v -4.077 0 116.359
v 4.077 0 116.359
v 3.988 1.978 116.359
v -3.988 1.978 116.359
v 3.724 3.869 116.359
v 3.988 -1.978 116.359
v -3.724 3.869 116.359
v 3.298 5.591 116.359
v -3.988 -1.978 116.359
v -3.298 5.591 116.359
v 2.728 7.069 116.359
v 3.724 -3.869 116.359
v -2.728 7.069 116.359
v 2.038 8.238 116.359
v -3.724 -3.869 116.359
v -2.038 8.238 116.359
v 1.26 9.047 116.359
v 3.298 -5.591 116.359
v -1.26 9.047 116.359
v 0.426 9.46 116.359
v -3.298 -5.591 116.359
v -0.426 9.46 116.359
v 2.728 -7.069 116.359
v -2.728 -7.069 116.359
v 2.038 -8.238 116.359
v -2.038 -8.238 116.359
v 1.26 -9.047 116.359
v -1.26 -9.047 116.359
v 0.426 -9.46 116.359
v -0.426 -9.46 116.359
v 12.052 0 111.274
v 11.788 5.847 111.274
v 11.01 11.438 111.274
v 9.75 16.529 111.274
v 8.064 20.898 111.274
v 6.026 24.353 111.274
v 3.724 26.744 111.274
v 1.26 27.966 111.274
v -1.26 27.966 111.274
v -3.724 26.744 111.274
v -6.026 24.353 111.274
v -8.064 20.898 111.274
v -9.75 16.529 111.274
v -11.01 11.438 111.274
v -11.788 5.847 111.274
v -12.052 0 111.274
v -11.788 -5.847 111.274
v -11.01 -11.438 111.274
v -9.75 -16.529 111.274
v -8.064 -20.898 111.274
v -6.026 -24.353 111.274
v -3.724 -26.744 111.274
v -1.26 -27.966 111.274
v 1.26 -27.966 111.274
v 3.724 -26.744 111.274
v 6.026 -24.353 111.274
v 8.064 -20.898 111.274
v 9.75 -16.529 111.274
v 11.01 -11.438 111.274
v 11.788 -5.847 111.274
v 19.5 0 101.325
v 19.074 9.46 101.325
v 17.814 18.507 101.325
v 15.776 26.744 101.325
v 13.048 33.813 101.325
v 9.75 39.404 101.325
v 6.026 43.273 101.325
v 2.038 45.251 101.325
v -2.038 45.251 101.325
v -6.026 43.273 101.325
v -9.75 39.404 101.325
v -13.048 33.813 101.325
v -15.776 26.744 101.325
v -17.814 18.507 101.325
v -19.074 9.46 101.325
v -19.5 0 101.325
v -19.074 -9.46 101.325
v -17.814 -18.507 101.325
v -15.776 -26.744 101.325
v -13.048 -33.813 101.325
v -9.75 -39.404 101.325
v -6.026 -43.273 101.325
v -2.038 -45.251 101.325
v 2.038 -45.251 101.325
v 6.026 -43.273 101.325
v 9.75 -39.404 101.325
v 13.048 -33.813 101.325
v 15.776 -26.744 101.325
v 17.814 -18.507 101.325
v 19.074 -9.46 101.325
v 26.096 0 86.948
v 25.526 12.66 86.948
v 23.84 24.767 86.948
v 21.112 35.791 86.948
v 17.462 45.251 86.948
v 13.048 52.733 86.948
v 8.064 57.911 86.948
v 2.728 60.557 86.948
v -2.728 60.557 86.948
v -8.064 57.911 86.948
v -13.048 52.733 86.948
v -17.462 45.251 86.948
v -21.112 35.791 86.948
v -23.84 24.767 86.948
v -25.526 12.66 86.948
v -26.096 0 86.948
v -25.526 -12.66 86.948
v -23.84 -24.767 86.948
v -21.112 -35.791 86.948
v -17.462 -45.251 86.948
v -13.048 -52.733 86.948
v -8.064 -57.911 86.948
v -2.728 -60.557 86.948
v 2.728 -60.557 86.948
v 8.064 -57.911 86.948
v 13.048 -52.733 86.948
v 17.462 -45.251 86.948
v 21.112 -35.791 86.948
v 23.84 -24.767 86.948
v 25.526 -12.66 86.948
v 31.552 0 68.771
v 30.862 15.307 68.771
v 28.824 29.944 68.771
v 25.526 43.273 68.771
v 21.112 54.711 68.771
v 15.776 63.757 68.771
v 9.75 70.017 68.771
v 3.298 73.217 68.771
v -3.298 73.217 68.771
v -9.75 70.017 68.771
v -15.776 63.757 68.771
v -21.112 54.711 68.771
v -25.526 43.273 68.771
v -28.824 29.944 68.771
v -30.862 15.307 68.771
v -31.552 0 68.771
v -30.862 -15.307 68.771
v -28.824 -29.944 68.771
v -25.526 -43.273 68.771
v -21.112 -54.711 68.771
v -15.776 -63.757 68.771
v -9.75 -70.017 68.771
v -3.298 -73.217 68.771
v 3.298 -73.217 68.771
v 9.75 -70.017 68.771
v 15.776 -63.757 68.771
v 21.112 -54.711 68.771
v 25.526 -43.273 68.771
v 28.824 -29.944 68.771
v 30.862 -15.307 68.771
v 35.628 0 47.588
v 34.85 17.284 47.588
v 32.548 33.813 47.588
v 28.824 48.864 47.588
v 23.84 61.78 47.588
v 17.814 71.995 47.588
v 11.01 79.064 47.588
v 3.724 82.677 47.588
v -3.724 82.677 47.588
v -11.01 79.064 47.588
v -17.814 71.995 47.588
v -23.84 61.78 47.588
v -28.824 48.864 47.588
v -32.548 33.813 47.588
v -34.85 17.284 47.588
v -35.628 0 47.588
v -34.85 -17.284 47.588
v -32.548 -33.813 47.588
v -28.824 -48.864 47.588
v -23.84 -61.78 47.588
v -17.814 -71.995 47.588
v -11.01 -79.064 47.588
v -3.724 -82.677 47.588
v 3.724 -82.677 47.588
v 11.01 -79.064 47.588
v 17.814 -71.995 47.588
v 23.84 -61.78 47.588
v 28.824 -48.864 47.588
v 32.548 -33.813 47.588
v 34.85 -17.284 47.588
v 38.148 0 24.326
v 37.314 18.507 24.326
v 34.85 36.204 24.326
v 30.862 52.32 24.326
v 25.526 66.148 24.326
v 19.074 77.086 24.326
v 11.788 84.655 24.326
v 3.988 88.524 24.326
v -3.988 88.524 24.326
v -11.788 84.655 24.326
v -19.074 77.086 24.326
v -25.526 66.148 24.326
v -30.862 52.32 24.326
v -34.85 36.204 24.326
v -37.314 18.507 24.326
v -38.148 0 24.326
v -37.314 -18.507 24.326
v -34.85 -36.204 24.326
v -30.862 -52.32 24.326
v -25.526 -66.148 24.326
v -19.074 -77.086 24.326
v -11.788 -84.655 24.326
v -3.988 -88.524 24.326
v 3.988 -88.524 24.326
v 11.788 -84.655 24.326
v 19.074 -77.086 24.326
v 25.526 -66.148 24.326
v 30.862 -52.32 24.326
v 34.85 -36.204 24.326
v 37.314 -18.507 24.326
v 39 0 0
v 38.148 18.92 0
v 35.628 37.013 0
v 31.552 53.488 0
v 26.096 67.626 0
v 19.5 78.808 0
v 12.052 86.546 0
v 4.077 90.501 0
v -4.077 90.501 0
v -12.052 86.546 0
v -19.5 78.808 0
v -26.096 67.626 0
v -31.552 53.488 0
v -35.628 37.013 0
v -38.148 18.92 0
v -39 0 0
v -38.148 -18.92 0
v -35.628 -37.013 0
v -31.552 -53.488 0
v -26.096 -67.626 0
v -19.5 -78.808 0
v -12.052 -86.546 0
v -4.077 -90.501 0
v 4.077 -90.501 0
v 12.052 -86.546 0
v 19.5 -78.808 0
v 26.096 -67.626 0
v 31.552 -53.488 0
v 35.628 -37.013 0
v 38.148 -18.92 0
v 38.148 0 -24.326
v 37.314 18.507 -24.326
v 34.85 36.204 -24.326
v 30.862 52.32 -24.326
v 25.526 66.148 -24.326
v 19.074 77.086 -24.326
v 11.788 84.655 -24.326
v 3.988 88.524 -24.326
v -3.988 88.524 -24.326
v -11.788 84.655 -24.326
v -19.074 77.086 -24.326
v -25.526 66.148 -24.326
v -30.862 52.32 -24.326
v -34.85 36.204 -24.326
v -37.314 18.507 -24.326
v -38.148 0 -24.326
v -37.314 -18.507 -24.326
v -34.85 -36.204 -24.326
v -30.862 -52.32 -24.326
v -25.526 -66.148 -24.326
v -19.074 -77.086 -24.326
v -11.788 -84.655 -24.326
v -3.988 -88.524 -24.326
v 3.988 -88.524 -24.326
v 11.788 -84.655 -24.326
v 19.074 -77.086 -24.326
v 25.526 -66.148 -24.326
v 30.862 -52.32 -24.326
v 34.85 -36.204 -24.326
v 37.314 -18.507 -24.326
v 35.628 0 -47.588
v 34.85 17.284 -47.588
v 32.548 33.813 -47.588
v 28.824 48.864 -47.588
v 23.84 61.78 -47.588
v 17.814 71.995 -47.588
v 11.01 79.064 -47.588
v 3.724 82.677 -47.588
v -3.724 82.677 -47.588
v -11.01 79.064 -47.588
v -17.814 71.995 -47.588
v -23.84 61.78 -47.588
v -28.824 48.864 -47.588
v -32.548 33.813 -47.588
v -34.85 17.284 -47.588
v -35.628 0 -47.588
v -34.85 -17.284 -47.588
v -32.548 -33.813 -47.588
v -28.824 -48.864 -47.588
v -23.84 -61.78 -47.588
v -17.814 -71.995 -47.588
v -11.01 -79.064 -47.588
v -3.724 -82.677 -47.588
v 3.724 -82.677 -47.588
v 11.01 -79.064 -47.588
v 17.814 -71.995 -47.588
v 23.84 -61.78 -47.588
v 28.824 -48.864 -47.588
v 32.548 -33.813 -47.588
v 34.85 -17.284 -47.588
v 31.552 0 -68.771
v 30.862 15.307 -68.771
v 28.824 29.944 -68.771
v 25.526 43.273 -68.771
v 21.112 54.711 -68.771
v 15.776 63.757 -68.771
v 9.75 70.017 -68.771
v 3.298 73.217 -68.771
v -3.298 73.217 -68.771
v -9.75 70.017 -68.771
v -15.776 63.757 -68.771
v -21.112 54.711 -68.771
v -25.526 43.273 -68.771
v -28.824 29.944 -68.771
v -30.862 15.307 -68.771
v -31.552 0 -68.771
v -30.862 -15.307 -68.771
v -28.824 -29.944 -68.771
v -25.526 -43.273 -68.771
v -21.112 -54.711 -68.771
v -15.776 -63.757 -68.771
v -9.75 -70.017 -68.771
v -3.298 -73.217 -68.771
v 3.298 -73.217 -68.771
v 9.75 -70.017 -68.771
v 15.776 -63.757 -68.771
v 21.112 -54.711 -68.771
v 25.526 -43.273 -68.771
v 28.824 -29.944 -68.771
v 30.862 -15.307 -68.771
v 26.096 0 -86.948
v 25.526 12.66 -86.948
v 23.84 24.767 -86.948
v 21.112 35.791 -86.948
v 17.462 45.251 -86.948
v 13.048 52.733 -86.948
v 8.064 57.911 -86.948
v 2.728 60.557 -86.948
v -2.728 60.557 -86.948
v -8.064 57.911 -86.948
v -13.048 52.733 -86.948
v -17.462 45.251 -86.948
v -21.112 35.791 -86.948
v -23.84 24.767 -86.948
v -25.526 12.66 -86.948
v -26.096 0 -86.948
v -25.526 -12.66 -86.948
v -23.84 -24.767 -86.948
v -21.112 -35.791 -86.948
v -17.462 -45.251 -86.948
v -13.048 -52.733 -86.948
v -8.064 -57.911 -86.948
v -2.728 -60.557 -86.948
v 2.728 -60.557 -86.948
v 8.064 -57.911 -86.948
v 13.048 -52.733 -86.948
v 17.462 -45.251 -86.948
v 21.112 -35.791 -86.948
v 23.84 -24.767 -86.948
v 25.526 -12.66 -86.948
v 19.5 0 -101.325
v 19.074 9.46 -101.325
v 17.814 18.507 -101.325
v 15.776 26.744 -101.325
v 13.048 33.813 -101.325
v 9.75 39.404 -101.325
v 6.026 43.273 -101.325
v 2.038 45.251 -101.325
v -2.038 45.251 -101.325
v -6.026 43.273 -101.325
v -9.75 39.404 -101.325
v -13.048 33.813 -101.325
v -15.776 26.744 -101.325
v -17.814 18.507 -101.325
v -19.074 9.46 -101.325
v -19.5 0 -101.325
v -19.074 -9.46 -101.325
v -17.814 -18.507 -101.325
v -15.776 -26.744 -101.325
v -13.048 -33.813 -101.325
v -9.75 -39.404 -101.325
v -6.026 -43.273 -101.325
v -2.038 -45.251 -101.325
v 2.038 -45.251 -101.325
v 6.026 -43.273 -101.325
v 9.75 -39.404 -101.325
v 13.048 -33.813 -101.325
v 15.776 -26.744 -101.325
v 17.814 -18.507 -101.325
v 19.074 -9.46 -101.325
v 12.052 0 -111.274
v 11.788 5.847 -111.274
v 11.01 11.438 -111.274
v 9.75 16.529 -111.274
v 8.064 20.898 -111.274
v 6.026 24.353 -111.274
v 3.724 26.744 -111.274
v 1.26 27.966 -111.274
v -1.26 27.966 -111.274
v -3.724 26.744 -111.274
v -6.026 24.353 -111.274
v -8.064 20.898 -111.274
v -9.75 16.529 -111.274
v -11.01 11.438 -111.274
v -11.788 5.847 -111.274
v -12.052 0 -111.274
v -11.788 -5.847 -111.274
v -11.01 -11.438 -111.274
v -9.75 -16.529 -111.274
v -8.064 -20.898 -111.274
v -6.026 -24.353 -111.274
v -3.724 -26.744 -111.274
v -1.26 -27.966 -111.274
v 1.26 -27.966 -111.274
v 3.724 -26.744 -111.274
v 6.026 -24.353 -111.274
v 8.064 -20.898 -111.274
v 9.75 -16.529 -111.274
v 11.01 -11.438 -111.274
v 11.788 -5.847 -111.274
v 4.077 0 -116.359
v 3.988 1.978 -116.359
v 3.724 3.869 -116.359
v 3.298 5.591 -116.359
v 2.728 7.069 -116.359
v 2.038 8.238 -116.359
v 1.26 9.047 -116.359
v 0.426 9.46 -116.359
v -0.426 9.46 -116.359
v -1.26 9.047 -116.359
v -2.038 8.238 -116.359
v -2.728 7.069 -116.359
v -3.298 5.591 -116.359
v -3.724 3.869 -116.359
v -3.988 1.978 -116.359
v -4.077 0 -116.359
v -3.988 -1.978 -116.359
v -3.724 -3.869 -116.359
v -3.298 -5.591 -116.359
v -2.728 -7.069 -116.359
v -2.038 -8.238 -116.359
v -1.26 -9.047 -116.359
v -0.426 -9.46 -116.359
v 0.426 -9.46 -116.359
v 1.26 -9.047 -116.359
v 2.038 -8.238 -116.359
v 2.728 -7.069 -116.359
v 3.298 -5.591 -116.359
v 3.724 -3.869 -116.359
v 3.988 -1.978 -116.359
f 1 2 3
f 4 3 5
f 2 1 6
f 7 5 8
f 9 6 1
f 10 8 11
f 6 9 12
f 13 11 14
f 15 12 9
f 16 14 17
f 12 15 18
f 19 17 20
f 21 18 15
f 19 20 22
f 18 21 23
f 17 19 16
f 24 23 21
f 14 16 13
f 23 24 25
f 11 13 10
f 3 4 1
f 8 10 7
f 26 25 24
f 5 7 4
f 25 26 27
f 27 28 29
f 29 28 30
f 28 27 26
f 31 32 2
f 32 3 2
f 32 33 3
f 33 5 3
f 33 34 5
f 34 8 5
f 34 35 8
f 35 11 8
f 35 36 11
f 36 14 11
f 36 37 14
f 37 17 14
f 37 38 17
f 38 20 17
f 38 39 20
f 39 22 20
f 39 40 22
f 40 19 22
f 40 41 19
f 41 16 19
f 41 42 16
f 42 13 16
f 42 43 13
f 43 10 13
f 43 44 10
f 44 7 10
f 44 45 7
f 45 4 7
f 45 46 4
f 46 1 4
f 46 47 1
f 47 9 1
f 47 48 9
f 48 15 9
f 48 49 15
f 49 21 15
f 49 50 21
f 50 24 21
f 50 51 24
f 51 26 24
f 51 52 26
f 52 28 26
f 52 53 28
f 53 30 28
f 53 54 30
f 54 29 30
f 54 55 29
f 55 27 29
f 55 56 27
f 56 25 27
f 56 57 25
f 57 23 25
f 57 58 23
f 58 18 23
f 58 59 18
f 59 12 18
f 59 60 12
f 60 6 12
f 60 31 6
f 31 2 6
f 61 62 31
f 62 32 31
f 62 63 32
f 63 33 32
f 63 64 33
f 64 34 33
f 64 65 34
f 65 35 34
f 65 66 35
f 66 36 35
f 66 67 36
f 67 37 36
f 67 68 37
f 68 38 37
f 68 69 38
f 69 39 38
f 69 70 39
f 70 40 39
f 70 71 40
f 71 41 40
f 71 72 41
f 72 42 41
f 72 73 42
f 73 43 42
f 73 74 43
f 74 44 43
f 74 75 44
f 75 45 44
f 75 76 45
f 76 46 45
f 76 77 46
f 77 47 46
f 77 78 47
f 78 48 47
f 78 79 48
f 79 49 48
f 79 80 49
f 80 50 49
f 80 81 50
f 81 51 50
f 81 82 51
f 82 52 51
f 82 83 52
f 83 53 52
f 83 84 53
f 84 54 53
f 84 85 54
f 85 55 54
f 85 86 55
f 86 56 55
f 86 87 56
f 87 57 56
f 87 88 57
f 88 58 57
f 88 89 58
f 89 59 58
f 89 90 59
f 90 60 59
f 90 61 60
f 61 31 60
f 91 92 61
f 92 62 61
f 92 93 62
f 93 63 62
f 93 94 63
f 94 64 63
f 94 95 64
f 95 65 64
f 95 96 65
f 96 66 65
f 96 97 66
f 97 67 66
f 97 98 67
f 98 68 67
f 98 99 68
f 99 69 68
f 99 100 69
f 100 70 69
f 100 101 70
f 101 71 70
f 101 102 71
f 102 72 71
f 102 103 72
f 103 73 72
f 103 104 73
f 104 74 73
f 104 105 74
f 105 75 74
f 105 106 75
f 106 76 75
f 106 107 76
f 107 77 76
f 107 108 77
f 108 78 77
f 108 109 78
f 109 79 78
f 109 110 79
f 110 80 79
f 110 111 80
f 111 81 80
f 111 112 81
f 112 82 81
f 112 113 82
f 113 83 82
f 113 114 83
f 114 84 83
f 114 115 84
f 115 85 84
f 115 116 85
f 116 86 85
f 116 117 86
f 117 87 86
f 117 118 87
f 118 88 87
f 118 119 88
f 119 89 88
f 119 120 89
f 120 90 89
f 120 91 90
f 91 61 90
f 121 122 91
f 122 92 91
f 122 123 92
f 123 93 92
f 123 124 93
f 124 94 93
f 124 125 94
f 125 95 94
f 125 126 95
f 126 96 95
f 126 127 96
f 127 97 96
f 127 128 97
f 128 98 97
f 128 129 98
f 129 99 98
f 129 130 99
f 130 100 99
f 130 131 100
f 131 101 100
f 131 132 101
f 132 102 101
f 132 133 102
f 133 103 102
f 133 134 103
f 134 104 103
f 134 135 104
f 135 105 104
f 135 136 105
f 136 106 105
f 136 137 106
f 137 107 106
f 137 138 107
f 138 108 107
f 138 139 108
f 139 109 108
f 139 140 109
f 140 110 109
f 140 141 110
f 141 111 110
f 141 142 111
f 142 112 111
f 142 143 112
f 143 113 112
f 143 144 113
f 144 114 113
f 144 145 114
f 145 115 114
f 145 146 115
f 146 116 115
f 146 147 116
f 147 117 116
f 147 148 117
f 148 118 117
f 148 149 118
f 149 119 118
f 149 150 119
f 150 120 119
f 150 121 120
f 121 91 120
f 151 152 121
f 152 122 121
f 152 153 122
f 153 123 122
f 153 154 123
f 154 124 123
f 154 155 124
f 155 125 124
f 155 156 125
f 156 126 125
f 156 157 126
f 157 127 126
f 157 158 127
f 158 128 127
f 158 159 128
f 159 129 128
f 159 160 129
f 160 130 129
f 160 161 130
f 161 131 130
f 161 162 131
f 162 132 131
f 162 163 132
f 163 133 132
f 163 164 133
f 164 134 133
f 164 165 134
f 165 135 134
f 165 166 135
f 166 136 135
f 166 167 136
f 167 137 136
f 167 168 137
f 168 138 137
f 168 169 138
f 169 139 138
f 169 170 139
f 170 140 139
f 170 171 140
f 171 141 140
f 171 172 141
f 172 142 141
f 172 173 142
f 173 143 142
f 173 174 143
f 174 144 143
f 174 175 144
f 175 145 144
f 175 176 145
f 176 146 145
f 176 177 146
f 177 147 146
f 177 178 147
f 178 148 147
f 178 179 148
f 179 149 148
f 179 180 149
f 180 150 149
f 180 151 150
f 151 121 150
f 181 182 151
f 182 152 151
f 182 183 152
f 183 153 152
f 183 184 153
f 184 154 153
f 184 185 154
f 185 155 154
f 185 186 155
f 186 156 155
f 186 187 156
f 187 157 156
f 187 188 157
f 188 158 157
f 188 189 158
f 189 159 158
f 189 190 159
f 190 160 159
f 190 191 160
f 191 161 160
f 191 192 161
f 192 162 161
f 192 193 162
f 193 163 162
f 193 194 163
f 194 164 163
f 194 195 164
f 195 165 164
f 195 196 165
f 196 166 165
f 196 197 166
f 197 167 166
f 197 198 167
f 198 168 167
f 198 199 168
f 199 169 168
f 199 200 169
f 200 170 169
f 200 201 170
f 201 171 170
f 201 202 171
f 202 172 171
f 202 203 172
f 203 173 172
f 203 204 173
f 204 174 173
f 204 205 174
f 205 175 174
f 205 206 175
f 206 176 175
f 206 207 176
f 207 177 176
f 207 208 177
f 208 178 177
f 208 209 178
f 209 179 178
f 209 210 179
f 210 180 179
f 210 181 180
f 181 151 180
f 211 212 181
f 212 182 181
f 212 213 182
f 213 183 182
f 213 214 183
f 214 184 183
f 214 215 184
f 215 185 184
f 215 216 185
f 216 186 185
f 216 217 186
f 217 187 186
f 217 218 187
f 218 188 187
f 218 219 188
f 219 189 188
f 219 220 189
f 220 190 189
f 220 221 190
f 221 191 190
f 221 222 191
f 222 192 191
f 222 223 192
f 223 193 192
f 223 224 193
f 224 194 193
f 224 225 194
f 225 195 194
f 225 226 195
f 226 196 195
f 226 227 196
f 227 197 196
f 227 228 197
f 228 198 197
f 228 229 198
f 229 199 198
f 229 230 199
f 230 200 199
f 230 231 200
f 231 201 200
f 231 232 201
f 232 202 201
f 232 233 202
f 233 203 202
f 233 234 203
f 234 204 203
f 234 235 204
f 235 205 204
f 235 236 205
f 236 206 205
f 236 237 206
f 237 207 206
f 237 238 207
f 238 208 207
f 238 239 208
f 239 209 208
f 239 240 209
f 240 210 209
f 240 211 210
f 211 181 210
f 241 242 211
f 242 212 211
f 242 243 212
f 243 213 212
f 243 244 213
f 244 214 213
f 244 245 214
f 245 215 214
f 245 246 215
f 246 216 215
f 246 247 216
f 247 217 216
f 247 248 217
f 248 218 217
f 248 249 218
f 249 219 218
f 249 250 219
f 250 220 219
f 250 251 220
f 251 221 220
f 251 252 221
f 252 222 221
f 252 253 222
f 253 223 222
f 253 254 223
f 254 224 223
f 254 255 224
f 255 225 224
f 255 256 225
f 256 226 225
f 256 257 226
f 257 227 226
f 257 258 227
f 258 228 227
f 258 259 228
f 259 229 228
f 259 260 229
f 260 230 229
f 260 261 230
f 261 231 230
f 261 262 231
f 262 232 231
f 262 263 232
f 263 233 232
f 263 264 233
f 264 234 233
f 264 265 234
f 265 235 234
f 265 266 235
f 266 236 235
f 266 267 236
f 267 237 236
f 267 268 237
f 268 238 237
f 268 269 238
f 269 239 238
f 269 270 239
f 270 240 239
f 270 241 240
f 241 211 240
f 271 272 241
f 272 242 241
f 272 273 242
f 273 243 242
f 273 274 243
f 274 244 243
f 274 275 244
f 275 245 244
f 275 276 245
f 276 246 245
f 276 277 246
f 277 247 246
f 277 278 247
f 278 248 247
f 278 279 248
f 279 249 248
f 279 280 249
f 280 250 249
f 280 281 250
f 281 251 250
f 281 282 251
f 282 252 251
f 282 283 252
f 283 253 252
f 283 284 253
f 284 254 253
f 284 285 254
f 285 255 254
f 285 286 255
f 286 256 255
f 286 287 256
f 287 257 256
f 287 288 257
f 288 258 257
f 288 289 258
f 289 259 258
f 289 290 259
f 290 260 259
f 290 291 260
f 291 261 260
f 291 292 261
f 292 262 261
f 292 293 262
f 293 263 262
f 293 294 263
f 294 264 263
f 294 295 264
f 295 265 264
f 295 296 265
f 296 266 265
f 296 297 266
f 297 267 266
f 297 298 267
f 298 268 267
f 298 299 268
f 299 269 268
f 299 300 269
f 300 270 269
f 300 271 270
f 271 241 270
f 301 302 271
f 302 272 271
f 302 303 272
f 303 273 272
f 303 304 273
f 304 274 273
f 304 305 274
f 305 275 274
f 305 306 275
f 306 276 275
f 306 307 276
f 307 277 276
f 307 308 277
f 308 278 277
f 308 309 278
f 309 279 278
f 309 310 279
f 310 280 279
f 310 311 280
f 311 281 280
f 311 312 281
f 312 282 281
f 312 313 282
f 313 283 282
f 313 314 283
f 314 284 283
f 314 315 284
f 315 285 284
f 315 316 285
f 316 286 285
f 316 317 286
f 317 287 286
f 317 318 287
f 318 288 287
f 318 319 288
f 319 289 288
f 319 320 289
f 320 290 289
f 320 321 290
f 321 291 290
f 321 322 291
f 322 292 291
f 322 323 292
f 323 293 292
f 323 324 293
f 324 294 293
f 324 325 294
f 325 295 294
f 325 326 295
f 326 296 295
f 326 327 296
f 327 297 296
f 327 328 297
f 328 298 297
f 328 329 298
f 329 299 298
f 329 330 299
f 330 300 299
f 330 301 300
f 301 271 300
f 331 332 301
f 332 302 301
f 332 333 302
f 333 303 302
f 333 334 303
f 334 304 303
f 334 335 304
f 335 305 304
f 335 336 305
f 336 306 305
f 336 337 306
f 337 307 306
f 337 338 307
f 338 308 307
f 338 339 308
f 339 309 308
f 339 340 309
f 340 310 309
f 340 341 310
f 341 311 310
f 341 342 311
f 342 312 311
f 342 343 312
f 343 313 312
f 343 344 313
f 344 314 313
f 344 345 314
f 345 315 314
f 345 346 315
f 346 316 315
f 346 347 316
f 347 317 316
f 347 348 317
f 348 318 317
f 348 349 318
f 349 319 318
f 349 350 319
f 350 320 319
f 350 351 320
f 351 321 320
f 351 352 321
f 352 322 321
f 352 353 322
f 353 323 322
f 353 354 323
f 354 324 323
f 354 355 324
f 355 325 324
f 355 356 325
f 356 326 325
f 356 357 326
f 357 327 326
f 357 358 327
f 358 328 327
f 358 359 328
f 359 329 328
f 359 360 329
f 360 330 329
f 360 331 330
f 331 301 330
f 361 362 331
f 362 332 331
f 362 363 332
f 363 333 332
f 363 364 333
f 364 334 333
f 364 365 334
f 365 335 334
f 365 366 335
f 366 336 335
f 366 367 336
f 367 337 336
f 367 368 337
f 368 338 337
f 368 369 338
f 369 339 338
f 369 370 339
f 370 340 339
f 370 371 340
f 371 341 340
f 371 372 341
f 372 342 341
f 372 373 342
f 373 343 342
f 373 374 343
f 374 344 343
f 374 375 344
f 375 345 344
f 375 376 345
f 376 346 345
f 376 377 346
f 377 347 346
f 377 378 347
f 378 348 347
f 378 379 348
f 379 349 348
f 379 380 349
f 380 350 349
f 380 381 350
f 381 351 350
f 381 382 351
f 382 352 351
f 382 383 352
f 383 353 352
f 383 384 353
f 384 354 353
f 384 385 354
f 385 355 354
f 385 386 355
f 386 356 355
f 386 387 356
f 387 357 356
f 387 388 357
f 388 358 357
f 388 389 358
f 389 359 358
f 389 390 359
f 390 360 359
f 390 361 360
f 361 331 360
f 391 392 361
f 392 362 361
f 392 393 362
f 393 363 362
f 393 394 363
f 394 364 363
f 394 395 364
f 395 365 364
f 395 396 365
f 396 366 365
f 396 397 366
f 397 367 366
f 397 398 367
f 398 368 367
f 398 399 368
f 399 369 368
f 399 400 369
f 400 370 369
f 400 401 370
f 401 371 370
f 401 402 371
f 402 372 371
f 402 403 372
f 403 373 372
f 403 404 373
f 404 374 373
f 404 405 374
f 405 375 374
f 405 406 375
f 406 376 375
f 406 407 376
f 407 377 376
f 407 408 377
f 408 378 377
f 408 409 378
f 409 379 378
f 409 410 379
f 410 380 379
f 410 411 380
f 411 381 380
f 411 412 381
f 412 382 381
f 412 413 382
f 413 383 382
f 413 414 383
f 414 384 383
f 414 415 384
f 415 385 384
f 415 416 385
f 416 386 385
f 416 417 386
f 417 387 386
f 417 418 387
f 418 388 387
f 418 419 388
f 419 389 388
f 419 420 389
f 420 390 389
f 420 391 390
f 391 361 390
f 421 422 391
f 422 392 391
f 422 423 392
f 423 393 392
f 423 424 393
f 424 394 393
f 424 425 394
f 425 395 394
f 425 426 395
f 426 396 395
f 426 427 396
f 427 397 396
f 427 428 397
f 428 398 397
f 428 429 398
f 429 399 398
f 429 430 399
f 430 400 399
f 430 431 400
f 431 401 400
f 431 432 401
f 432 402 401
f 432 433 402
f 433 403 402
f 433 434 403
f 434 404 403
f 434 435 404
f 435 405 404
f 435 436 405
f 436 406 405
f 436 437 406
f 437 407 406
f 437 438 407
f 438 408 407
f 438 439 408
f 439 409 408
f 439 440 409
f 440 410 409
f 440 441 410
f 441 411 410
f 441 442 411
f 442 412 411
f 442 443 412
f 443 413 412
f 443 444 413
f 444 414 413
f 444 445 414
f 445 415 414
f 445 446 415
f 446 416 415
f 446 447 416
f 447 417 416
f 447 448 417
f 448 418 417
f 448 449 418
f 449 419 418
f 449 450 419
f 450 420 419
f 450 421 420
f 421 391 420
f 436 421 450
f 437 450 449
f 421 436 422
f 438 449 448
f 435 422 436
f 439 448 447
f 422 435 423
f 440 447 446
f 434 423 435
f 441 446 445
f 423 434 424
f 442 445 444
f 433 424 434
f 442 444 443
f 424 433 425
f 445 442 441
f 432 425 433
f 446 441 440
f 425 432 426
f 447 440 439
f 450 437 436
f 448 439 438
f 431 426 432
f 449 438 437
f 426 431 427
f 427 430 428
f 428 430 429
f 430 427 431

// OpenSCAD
// Generated by SolidPython 1.0.1 on 2020-07-29 00:39:25


scale(v = [3, 7, 9]) {
	sphere(r = 13);
}
/***********************************************
*********      SolidPython code:      **********
************************************************
 
# import packages: SolidPython
from solid import *
from solid.utils import *
from itertools import chain, combinations


class Resize:

    def __init__(self, scad_file):
        self.scad_file = scad_file
        #self.scad_file = import_scad(scad_file)
        # cone/cylinder param:
        self.r1 = 0
        self.r2 = 0
        self.h = 0
        # rectangular prism param:
        self.w = 0
        self.l = 0
        # ellipse param:
        self.r = 0

    # import OpenScad code (file name corresponds to shape)


    # classify shape + parameters
    def assign(self, param1, param2, param3):
        if self.scad_file == 'cone.scad':
            self.r1 = param1
            self.r2 = param2
            self.h = param3
        elif self.scad_file == 'cylinder.scad':
            self.r1 = param1
            self.r2 = param2
            self.h = param3
        elif self.scad_file == 'rectangularPrism.scad':
            self.h = param1
            self.l = param2
            self.w = param3
        else:
            self.r = param1
            self.h = param2

    # resize parameters
    def iterate(self):
        x = range(3, 20, 2)
        i = 1
        if self.scad_file == 'cone.scad':
            tempList = list(combinations(x, 2))
            for temp in tempList:
                param1 = temp[0]
                param2 = temp[1]
                filepath = 'produced_scad_files/' + 'cone' + str(param1) + '_' + str(param2) + '_' + '.scad'
                scad_render_to_file(cylinder(h=param1, r1=param2, r2=0), filepath)

        elif self.scad_file == 'cylinder.scad':
            tempList = list(combinations(x, 3))
            for temp in tempList:
                param1 = temp[0]
                param2 = temp[1]
                filepath = 'produced_scad_files/' + 'cylinder' + str(param1) + '_' + str(param2) + '_' + '.scad'
                scad_render_to_file(cylinder(h=param1, r1=param2, r2=param2), filepath)

        elif self.scad_file == 'rectangularPrism.scad':
            tempList = list(combinations(x, 3))
            for temp in tempList:
                param1 = temp[0]
                param2 = temp[1]
                param3 = temp[2]
                filepath = 'produced_scad_files/' + 'rectangularPrism' + str(param1) + '_' + str(param2) + '_' + str(
                    param3) + '.scad'
                scad_render_to_file(cube(size=(param1, param2, param3)), filepath)

        elif self.scad_file == 'ellipse.scad':
            tempList = list(combinations(x, 4))
            for temp in tempList:
                param1 = temp[0]
                param2 = temp[1]
                param3 = temp[2]
                param4 = temp[3]
                filepath = 'produced_scad_files/' + 'ellipse' + str(param1) + '_' + str(param2) + '_' + str(param3) + '_' + str(param4) + '.scad'
                scad_render_to_file(scale([param1, param2, param3])(sphere(r=param4)), filepath)

    def render_to_scadfile(self):
        scad_render_to_file(scad, 'example.scad') 
 
************************************************/
